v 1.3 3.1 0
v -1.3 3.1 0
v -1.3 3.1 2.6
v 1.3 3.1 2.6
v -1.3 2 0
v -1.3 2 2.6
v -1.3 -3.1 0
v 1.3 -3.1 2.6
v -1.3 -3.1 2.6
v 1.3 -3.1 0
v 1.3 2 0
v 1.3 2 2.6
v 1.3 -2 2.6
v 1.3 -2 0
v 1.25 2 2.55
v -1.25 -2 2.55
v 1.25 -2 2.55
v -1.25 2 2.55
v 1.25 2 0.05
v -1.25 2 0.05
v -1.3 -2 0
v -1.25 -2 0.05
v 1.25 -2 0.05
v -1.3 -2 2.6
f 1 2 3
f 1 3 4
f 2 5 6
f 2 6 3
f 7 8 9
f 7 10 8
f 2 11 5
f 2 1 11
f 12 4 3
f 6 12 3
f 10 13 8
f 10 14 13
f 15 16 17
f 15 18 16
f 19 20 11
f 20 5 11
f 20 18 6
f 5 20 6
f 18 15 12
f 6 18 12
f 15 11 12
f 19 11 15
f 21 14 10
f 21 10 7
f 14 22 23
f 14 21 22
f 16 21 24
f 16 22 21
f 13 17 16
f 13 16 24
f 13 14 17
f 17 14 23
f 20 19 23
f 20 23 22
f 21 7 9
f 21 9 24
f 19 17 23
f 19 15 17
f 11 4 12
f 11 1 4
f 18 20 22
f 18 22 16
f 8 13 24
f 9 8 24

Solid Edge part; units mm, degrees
sketch "Sketch1" plane through (0, 0, 0) normal (0, 0, 1) x (1, 0, 0)
  line L0 (1.3, -3.1) -> (-1.3, -3.1)
  line L1 (-1.3, -3.1) -> (-1.3, 3.1)
  line L2 (-1.3, 3.1) -> (1.3, 3.1)
  line L3 (1.3, 3.1) -> (1.3, -3.1)
  dimension "D1" = 6.2
  dimension "D2" = 2.6
extrude "Protrusion1" add sketch "Sketch1" along normal blind 2.6
sketch "Sketch2" plane through (0, 0, 1.3) normal (0, -1, 0) x (1, 0, 0)
  line L0 (1.25, -1.25) -> (-1.25, -1.25)
  line L1 (-1.25, -1.25) -> (-1.25, 1.25)
  line L2 (-1.25, 1.25) -> (1.25, 1.25)
  line L3 (1.25, 1.25) -> (1.25, -1.25)
  line L4 (5.1749, -4.7518) -> (-2.2441, -4.7518)
  line L5 (-2.2441, -4.7518) -> (-2.2441, 1.7883)
  line L6 (-2.2441, 1.7883) -> (5.1749, 1.7883)
  line L7 (5.1749, 1.7883) -> (5.1749, -4.7518)
  dimension "D1" = 2.5
  dimension "D2" = 2.5
  dimension "D3" = 1.25
  dimension "D4" = 1.25
extrude "Extrusionsausschnitt_1" cut sketch "Sketch2" along normal mid plane 4
